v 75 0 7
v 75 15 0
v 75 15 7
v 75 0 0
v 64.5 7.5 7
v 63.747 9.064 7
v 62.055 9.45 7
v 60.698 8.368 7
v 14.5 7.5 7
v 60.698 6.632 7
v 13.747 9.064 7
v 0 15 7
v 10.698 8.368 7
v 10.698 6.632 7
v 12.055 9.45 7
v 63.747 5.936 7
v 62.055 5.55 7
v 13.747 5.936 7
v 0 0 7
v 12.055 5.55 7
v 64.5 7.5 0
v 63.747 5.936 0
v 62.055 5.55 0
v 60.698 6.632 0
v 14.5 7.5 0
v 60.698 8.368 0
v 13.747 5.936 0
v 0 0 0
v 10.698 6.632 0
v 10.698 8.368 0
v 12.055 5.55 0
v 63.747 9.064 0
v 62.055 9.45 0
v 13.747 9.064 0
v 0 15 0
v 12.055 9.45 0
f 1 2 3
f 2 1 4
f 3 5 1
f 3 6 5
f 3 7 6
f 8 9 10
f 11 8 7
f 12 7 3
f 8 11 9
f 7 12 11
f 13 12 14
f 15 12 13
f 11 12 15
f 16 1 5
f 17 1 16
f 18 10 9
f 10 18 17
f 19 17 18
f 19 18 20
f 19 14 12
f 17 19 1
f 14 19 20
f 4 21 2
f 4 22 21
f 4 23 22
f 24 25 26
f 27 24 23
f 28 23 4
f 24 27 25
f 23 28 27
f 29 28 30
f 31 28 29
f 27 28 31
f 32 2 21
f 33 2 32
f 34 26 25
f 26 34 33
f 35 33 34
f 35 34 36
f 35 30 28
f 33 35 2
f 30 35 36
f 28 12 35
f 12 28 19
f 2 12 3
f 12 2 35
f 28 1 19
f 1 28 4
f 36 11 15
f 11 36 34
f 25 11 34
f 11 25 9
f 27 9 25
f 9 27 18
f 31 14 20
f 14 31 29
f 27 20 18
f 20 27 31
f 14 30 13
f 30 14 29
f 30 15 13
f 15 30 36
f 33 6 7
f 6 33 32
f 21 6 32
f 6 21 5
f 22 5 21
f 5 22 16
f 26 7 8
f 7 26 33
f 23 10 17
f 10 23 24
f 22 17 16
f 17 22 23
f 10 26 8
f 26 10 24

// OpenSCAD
h=7;
l=75;
w=15;
//m4 screws
m4_d=4;
m4_head_d=7;
m4_head_h=4;
difference(){
    cube([l,w,h]);
    translate([12.5,w/2,0])
    #cylinder(d=m4_d, h=h*2);
        translate([62.5,w/2,0])
    #cylinder(d=m4_d, h=h*2);
}
